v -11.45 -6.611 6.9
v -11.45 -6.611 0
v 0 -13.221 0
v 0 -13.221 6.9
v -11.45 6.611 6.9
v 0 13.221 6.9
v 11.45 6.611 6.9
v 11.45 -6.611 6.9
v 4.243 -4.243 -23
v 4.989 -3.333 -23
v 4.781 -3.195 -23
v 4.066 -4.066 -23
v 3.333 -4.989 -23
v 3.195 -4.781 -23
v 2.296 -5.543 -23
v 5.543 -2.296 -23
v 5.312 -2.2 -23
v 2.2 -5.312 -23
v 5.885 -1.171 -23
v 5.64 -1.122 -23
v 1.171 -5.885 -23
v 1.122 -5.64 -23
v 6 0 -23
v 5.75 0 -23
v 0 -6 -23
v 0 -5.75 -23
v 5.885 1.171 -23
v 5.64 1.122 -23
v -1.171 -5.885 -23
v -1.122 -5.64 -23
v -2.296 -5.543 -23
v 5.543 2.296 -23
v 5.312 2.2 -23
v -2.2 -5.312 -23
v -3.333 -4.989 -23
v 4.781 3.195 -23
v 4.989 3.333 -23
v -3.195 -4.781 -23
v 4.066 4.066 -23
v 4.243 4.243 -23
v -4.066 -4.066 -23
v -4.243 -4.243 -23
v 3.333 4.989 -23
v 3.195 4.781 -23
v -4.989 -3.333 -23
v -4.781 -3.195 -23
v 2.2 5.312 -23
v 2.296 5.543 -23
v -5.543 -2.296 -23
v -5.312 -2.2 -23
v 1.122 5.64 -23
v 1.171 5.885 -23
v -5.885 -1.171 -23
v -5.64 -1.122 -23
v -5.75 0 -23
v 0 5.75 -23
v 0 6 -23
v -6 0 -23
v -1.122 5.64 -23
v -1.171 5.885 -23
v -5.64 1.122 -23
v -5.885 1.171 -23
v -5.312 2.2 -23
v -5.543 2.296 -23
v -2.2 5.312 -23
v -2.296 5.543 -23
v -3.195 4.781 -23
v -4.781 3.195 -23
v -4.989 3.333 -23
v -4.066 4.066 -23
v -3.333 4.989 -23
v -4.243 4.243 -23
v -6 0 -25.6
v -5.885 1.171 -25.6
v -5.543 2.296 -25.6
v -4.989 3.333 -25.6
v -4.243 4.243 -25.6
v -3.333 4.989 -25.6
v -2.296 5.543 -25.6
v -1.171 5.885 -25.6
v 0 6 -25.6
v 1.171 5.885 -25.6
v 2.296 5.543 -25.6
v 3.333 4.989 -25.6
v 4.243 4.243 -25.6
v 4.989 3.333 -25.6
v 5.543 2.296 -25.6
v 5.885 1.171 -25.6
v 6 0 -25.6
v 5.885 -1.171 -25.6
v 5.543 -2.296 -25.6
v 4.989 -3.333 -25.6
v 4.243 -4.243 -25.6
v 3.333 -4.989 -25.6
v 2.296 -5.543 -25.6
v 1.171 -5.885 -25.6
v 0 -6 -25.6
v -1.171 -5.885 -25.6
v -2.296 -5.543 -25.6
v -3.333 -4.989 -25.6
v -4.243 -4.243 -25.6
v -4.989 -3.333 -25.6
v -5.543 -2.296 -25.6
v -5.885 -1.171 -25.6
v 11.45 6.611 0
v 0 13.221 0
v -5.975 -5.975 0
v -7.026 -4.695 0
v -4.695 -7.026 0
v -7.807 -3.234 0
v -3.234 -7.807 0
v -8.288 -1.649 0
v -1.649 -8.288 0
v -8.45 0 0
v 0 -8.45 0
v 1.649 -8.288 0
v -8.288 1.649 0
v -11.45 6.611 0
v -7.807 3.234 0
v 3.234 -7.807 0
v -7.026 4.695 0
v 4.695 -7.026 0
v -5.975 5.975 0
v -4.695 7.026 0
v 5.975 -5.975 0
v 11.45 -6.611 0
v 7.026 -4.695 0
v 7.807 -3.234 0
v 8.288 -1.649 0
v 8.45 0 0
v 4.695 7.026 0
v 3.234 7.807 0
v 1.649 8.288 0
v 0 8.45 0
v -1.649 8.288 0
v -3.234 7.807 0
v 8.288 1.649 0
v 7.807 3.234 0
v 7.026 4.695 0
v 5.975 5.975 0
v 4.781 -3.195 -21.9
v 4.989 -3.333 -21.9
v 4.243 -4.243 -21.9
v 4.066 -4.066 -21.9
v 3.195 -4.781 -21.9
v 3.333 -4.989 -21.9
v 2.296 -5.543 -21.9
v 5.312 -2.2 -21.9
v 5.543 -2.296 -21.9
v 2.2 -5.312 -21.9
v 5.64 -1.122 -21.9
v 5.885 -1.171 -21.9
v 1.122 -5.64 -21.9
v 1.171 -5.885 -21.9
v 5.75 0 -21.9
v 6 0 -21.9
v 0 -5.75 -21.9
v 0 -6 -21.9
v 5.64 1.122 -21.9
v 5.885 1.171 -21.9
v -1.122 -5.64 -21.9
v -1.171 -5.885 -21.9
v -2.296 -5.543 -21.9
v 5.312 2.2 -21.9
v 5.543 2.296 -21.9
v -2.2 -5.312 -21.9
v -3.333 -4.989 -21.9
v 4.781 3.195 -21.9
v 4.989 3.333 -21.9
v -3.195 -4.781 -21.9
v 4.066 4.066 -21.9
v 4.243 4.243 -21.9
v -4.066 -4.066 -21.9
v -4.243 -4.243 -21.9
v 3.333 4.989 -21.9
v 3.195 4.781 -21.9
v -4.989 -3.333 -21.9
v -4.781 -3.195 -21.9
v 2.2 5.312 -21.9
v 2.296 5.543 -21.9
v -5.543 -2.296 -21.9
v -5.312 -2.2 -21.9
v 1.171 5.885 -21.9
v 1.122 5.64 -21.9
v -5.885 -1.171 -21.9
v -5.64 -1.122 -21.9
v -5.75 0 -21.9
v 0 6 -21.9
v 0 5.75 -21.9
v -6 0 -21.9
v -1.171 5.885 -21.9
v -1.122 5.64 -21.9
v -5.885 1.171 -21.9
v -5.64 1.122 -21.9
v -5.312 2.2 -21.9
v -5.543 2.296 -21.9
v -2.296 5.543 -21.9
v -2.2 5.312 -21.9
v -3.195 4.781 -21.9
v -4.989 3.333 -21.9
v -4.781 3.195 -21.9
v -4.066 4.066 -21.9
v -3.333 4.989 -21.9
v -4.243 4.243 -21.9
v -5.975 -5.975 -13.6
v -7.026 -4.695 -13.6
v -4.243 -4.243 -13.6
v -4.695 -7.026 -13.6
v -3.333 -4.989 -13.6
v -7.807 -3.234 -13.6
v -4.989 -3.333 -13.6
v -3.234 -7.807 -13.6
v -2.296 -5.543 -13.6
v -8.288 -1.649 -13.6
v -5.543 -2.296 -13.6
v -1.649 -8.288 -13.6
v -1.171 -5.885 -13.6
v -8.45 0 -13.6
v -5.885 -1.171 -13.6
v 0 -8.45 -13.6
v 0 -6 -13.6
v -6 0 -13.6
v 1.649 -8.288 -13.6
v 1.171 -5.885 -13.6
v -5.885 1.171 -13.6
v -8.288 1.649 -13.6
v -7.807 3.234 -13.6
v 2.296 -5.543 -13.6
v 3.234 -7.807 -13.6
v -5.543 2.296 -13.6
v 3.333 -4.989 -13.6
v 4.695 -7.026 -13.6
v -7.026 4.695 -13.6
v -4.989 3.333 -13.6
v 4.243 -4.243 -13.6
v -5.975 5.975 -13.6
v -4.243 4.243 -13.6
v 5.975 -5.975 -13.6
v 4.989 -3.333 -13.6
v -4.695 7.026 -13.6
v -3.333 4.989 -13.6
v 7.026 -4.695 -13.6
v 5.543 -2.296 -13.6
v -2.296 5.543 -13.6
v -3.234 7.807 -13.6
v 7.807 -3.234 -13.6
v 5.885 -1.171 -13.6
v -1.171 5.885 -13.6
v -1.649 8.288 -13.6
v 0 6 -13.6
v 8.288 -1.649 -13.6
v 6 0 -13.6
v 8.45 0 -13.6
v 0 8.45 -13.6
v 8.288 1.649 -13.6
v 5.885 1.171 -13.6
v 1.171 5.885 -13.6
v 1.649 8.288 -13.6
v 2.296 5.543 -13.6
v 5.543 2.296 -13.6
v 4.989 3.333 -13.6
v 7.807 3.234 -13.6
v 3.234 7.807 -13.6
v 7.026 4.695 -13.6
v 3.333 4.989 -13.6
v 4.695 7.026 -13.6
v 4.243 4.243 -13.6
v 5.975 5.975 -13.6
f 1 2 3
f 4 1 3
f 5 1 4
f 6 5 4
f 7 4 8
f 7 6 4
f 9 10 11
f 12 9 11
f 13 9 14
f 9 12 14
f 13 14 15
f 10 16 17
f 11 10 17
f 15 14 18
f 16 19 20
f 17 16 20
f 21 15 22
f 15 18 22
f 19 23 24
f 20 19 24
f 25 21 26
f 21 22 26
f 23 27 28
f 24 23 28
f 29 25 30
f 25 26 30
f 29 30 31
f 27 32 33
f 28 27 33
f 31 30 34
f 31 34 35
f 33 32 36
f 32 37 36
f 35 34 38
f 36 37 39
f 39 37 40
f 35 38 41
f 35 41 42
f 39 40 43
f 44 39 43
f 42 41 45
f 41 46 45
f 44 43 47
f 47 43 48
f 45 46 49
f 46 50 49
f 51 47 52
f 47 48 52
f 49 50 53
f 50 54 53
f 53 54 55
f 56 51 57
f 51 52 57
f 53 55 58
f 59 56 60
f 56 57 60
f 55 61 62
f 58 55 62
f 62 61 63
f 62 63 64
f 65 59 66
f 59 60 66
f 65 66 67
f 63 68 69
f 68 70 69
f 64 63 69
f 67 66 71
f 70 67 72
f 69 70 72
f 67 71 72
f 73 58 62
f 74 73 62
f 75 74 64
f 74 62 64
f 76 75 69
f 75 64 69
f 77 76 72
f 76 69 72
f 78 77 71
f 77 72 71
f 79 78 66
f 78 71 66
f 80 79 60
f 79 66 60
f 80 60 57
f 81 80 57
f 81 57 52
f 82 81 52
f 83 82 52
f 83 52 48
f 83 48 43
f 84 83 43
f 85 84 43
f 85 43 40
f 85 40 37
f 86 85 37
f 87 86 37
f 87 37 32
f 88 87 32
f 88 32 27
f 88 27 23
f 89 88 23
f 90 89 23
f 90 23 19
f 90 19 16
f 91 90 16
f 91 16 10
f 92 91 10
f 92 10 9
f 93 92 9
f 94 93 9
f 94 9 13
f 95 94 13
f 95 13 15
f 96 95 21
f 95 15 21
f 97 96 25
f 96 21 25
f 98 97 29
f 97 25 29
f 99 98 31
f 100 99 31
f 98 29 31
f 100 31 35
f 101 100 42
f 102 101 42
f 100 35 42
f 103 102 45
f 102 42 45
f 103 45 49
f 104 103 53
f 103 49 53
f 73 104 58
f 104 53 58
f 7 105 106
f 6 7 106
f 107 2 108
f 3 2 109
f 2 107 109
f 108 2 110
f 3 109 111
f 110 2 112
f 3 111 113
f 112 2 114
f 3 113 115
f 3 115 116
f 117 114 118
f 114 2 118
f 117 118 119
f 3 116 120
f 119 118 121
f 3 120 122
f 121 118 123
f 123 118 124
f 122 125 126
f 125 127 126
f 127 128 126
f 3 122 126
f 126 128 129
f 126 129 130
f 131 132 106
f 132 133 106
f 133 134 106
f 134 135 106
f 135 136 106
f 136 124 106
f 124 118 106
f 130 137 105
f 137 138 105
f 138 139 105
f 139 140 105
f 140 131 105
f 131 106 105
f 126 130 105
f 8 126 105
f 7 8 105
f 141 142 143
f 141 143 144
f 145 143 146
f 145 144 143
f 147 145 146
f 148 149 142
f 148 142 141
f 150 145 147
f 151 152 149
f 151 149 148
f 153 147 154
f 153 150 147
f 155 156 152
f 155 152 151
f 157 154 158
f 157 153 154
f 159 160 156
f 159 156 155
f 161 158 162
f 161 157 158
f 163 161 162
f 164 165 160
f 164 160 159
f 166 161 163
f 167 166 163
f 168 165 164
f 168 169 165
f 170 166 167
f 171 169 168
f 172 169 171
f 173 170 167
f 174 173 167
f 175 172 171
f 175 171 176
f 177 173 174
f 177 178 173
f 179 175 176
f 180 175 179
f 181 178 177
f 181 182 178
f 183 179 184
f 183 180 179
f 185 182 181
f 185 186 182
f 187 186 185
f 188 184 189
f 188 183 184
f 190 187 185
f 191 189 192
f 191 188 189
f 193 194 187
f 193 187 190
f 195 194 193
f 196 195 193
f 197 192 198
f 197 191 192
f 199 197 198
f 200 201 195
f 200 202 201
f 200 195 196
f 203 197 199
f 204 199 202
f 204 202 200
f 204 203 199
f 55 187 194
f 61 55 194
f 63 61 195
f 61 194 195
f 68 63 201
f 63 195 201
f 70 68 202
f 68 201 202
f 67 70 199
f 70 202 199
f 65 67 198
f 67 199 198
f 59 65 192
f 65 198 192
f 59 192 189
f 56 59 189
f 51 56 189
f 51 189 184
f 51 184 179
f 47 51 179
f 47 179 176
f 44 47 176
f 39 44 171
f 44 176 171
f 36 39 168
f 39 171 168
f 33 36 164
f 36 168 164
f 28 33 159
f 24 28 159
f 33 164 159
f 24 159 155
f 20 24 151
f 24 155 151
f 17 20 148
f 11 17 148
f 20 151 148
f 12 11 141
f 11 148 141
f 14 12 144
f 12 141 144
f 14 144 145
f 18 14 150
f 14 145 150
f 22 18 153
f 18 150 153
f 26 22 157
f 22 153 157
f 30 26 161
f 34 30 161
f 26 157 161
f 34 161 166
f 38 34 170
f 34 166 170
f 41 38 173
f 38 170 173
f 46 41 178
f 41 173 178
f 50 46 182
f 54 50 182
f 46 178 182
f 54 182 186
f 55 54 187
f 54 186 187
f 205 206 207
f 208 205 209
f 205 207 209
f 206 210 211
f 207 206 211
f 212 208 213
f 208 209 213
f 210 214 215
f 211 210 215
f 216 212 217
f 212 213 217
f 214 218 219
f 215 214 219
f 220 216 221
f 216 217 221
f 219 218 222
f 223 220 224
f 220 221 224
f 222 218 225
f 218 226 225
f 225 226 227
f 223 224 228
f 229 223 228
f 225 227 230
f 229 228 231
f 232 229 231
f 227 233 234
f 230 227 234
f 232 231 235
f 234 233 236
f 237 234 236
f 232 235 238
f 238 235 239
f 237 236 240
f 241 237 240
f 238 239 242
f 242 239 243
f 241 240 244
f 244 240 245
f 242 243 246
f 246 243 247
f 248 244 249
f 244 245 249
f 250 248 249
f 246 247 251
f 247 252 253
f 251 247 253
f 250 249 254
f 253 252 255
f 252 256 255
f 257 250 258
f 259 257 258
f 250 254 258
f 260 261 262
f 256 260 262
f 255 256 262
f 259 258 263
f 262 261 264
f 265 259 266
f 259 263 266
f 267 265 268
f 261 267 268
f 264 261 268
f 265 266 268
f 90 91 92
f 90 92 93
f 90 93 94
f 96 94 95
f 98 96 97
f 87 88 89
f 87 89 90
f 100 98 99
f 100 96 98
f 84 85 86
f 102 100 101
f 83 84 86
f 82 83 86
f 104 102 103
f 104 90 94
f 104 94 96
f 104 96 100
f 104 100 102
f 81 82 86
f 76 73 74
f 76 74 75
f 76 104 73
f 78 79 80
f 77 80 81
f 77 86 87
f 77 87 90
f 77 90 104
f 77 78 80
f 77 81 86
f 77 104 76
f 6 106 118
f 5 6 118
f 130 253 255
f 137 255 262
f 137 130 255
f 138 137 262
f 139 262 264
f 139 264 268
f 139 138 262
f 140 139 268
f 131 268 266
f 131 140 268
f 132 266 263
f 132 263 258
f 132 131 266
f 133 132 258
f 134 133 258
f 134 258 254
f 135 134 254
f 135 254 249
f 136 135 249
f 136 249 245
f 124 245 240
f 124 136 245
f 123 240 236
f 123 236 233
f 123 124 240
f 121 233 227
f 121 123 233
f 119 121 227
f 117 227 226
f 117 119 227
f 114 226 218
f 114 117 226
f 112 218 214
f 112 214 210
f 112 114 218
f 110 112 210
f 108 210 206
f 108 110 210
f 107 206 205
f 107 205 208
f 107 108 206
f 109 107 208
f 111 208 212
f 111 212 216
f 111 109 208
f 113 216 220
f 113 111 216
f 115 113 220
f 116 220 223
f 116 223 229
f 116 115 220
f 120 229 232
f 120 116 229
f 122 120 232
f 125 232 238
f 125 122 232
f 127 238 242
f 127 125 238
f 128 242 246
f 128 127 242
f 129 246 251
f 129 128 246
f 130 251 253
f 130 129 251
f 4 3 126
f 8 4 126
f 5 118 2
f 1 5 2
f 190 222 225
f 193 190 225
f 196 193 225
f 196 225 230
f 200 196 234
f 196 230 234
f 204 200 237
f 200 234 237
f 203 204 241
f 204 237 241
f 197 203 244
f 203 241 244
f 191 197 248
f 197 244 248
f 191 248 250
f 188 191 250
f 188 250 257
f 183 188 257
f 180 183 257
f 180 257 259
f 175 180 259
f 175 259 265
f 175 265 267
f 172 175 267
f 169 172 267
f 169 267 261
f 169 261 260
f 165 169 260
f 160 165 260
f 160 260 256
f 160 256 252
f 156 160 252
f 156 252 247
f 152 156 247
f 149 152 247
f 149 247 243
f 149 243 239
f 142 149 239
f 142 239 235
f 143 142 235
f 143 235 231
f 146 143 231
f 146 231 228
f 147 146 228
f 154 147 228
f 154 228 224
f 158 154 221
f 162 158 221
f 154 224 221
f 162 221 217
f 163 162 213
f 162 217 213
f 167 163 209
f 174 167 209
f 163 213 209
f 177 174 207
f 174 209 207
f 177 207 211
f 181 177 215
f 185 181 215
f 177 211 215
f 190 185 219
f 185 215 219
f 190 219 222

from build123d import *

# Parameters (mm, degrees)
SKETCH1_R           = 8.45
BOSS_EXTRUDE1_DEPTH = 13.6
BOSS_EXTRUDE2_DEPTH = 6.9
SKETCH3_R           = 6
BOSS_EXTRUDE3_DEPTH = 12
SKETCH5_R           = 6
SKETCH5_R_2         = 5.75
CUT_EXTRUDE1_DEPTH  = 1.1


with BuildPart() as part:
    # Sketch1 → Boss-Extrude1 (new body)
    with BuildSketch(Plane.XY):
        Circle(SKETCH1_R)
    extrude(amount=-BOSS_EXTRUDE1_DEPTH)

    # Sketch2 → Boss-Extrude2 (add)
    with BuildSketch(Plane.XY):
        Polygon((0, 13.221321164), (-11.45, 6.610660582), (-11.45, -6.610660582), (0, -13.221321164), (11.45, -6.610660582), (11.45, 6.610660582), align=None)
    extrude(amount=BOSS_EXTRUDE2_DEPTH)

    # Sketch3 → Boss-Extrude3 (add)
    with BuildSketch(Plane(origin=(0, 0, -13.6), x_dir=(-1, 0, 0), z_dir=(0, 0, -1))):
        Circle(SKETCH3_R)
    extrude(amount=BOSS_EXTRUDE3_DEPTH)

    # Sketch5 → Cut-Extrude1 (cut)
    with BuildSketch(Plane(origin=(0, 0, -21.9), x_dir=(-1, 0, 0), z_dir=(0, 0, -1))):
        Circle(SKETCH5_R)
        Circle(SKETCH5_R_2, mode=Mode.SUBTRACT)
    extrude(amount=CUT_EXTRUDE1_DEPTH, mode=Mode.SUBTRACT)


solid = part.part
